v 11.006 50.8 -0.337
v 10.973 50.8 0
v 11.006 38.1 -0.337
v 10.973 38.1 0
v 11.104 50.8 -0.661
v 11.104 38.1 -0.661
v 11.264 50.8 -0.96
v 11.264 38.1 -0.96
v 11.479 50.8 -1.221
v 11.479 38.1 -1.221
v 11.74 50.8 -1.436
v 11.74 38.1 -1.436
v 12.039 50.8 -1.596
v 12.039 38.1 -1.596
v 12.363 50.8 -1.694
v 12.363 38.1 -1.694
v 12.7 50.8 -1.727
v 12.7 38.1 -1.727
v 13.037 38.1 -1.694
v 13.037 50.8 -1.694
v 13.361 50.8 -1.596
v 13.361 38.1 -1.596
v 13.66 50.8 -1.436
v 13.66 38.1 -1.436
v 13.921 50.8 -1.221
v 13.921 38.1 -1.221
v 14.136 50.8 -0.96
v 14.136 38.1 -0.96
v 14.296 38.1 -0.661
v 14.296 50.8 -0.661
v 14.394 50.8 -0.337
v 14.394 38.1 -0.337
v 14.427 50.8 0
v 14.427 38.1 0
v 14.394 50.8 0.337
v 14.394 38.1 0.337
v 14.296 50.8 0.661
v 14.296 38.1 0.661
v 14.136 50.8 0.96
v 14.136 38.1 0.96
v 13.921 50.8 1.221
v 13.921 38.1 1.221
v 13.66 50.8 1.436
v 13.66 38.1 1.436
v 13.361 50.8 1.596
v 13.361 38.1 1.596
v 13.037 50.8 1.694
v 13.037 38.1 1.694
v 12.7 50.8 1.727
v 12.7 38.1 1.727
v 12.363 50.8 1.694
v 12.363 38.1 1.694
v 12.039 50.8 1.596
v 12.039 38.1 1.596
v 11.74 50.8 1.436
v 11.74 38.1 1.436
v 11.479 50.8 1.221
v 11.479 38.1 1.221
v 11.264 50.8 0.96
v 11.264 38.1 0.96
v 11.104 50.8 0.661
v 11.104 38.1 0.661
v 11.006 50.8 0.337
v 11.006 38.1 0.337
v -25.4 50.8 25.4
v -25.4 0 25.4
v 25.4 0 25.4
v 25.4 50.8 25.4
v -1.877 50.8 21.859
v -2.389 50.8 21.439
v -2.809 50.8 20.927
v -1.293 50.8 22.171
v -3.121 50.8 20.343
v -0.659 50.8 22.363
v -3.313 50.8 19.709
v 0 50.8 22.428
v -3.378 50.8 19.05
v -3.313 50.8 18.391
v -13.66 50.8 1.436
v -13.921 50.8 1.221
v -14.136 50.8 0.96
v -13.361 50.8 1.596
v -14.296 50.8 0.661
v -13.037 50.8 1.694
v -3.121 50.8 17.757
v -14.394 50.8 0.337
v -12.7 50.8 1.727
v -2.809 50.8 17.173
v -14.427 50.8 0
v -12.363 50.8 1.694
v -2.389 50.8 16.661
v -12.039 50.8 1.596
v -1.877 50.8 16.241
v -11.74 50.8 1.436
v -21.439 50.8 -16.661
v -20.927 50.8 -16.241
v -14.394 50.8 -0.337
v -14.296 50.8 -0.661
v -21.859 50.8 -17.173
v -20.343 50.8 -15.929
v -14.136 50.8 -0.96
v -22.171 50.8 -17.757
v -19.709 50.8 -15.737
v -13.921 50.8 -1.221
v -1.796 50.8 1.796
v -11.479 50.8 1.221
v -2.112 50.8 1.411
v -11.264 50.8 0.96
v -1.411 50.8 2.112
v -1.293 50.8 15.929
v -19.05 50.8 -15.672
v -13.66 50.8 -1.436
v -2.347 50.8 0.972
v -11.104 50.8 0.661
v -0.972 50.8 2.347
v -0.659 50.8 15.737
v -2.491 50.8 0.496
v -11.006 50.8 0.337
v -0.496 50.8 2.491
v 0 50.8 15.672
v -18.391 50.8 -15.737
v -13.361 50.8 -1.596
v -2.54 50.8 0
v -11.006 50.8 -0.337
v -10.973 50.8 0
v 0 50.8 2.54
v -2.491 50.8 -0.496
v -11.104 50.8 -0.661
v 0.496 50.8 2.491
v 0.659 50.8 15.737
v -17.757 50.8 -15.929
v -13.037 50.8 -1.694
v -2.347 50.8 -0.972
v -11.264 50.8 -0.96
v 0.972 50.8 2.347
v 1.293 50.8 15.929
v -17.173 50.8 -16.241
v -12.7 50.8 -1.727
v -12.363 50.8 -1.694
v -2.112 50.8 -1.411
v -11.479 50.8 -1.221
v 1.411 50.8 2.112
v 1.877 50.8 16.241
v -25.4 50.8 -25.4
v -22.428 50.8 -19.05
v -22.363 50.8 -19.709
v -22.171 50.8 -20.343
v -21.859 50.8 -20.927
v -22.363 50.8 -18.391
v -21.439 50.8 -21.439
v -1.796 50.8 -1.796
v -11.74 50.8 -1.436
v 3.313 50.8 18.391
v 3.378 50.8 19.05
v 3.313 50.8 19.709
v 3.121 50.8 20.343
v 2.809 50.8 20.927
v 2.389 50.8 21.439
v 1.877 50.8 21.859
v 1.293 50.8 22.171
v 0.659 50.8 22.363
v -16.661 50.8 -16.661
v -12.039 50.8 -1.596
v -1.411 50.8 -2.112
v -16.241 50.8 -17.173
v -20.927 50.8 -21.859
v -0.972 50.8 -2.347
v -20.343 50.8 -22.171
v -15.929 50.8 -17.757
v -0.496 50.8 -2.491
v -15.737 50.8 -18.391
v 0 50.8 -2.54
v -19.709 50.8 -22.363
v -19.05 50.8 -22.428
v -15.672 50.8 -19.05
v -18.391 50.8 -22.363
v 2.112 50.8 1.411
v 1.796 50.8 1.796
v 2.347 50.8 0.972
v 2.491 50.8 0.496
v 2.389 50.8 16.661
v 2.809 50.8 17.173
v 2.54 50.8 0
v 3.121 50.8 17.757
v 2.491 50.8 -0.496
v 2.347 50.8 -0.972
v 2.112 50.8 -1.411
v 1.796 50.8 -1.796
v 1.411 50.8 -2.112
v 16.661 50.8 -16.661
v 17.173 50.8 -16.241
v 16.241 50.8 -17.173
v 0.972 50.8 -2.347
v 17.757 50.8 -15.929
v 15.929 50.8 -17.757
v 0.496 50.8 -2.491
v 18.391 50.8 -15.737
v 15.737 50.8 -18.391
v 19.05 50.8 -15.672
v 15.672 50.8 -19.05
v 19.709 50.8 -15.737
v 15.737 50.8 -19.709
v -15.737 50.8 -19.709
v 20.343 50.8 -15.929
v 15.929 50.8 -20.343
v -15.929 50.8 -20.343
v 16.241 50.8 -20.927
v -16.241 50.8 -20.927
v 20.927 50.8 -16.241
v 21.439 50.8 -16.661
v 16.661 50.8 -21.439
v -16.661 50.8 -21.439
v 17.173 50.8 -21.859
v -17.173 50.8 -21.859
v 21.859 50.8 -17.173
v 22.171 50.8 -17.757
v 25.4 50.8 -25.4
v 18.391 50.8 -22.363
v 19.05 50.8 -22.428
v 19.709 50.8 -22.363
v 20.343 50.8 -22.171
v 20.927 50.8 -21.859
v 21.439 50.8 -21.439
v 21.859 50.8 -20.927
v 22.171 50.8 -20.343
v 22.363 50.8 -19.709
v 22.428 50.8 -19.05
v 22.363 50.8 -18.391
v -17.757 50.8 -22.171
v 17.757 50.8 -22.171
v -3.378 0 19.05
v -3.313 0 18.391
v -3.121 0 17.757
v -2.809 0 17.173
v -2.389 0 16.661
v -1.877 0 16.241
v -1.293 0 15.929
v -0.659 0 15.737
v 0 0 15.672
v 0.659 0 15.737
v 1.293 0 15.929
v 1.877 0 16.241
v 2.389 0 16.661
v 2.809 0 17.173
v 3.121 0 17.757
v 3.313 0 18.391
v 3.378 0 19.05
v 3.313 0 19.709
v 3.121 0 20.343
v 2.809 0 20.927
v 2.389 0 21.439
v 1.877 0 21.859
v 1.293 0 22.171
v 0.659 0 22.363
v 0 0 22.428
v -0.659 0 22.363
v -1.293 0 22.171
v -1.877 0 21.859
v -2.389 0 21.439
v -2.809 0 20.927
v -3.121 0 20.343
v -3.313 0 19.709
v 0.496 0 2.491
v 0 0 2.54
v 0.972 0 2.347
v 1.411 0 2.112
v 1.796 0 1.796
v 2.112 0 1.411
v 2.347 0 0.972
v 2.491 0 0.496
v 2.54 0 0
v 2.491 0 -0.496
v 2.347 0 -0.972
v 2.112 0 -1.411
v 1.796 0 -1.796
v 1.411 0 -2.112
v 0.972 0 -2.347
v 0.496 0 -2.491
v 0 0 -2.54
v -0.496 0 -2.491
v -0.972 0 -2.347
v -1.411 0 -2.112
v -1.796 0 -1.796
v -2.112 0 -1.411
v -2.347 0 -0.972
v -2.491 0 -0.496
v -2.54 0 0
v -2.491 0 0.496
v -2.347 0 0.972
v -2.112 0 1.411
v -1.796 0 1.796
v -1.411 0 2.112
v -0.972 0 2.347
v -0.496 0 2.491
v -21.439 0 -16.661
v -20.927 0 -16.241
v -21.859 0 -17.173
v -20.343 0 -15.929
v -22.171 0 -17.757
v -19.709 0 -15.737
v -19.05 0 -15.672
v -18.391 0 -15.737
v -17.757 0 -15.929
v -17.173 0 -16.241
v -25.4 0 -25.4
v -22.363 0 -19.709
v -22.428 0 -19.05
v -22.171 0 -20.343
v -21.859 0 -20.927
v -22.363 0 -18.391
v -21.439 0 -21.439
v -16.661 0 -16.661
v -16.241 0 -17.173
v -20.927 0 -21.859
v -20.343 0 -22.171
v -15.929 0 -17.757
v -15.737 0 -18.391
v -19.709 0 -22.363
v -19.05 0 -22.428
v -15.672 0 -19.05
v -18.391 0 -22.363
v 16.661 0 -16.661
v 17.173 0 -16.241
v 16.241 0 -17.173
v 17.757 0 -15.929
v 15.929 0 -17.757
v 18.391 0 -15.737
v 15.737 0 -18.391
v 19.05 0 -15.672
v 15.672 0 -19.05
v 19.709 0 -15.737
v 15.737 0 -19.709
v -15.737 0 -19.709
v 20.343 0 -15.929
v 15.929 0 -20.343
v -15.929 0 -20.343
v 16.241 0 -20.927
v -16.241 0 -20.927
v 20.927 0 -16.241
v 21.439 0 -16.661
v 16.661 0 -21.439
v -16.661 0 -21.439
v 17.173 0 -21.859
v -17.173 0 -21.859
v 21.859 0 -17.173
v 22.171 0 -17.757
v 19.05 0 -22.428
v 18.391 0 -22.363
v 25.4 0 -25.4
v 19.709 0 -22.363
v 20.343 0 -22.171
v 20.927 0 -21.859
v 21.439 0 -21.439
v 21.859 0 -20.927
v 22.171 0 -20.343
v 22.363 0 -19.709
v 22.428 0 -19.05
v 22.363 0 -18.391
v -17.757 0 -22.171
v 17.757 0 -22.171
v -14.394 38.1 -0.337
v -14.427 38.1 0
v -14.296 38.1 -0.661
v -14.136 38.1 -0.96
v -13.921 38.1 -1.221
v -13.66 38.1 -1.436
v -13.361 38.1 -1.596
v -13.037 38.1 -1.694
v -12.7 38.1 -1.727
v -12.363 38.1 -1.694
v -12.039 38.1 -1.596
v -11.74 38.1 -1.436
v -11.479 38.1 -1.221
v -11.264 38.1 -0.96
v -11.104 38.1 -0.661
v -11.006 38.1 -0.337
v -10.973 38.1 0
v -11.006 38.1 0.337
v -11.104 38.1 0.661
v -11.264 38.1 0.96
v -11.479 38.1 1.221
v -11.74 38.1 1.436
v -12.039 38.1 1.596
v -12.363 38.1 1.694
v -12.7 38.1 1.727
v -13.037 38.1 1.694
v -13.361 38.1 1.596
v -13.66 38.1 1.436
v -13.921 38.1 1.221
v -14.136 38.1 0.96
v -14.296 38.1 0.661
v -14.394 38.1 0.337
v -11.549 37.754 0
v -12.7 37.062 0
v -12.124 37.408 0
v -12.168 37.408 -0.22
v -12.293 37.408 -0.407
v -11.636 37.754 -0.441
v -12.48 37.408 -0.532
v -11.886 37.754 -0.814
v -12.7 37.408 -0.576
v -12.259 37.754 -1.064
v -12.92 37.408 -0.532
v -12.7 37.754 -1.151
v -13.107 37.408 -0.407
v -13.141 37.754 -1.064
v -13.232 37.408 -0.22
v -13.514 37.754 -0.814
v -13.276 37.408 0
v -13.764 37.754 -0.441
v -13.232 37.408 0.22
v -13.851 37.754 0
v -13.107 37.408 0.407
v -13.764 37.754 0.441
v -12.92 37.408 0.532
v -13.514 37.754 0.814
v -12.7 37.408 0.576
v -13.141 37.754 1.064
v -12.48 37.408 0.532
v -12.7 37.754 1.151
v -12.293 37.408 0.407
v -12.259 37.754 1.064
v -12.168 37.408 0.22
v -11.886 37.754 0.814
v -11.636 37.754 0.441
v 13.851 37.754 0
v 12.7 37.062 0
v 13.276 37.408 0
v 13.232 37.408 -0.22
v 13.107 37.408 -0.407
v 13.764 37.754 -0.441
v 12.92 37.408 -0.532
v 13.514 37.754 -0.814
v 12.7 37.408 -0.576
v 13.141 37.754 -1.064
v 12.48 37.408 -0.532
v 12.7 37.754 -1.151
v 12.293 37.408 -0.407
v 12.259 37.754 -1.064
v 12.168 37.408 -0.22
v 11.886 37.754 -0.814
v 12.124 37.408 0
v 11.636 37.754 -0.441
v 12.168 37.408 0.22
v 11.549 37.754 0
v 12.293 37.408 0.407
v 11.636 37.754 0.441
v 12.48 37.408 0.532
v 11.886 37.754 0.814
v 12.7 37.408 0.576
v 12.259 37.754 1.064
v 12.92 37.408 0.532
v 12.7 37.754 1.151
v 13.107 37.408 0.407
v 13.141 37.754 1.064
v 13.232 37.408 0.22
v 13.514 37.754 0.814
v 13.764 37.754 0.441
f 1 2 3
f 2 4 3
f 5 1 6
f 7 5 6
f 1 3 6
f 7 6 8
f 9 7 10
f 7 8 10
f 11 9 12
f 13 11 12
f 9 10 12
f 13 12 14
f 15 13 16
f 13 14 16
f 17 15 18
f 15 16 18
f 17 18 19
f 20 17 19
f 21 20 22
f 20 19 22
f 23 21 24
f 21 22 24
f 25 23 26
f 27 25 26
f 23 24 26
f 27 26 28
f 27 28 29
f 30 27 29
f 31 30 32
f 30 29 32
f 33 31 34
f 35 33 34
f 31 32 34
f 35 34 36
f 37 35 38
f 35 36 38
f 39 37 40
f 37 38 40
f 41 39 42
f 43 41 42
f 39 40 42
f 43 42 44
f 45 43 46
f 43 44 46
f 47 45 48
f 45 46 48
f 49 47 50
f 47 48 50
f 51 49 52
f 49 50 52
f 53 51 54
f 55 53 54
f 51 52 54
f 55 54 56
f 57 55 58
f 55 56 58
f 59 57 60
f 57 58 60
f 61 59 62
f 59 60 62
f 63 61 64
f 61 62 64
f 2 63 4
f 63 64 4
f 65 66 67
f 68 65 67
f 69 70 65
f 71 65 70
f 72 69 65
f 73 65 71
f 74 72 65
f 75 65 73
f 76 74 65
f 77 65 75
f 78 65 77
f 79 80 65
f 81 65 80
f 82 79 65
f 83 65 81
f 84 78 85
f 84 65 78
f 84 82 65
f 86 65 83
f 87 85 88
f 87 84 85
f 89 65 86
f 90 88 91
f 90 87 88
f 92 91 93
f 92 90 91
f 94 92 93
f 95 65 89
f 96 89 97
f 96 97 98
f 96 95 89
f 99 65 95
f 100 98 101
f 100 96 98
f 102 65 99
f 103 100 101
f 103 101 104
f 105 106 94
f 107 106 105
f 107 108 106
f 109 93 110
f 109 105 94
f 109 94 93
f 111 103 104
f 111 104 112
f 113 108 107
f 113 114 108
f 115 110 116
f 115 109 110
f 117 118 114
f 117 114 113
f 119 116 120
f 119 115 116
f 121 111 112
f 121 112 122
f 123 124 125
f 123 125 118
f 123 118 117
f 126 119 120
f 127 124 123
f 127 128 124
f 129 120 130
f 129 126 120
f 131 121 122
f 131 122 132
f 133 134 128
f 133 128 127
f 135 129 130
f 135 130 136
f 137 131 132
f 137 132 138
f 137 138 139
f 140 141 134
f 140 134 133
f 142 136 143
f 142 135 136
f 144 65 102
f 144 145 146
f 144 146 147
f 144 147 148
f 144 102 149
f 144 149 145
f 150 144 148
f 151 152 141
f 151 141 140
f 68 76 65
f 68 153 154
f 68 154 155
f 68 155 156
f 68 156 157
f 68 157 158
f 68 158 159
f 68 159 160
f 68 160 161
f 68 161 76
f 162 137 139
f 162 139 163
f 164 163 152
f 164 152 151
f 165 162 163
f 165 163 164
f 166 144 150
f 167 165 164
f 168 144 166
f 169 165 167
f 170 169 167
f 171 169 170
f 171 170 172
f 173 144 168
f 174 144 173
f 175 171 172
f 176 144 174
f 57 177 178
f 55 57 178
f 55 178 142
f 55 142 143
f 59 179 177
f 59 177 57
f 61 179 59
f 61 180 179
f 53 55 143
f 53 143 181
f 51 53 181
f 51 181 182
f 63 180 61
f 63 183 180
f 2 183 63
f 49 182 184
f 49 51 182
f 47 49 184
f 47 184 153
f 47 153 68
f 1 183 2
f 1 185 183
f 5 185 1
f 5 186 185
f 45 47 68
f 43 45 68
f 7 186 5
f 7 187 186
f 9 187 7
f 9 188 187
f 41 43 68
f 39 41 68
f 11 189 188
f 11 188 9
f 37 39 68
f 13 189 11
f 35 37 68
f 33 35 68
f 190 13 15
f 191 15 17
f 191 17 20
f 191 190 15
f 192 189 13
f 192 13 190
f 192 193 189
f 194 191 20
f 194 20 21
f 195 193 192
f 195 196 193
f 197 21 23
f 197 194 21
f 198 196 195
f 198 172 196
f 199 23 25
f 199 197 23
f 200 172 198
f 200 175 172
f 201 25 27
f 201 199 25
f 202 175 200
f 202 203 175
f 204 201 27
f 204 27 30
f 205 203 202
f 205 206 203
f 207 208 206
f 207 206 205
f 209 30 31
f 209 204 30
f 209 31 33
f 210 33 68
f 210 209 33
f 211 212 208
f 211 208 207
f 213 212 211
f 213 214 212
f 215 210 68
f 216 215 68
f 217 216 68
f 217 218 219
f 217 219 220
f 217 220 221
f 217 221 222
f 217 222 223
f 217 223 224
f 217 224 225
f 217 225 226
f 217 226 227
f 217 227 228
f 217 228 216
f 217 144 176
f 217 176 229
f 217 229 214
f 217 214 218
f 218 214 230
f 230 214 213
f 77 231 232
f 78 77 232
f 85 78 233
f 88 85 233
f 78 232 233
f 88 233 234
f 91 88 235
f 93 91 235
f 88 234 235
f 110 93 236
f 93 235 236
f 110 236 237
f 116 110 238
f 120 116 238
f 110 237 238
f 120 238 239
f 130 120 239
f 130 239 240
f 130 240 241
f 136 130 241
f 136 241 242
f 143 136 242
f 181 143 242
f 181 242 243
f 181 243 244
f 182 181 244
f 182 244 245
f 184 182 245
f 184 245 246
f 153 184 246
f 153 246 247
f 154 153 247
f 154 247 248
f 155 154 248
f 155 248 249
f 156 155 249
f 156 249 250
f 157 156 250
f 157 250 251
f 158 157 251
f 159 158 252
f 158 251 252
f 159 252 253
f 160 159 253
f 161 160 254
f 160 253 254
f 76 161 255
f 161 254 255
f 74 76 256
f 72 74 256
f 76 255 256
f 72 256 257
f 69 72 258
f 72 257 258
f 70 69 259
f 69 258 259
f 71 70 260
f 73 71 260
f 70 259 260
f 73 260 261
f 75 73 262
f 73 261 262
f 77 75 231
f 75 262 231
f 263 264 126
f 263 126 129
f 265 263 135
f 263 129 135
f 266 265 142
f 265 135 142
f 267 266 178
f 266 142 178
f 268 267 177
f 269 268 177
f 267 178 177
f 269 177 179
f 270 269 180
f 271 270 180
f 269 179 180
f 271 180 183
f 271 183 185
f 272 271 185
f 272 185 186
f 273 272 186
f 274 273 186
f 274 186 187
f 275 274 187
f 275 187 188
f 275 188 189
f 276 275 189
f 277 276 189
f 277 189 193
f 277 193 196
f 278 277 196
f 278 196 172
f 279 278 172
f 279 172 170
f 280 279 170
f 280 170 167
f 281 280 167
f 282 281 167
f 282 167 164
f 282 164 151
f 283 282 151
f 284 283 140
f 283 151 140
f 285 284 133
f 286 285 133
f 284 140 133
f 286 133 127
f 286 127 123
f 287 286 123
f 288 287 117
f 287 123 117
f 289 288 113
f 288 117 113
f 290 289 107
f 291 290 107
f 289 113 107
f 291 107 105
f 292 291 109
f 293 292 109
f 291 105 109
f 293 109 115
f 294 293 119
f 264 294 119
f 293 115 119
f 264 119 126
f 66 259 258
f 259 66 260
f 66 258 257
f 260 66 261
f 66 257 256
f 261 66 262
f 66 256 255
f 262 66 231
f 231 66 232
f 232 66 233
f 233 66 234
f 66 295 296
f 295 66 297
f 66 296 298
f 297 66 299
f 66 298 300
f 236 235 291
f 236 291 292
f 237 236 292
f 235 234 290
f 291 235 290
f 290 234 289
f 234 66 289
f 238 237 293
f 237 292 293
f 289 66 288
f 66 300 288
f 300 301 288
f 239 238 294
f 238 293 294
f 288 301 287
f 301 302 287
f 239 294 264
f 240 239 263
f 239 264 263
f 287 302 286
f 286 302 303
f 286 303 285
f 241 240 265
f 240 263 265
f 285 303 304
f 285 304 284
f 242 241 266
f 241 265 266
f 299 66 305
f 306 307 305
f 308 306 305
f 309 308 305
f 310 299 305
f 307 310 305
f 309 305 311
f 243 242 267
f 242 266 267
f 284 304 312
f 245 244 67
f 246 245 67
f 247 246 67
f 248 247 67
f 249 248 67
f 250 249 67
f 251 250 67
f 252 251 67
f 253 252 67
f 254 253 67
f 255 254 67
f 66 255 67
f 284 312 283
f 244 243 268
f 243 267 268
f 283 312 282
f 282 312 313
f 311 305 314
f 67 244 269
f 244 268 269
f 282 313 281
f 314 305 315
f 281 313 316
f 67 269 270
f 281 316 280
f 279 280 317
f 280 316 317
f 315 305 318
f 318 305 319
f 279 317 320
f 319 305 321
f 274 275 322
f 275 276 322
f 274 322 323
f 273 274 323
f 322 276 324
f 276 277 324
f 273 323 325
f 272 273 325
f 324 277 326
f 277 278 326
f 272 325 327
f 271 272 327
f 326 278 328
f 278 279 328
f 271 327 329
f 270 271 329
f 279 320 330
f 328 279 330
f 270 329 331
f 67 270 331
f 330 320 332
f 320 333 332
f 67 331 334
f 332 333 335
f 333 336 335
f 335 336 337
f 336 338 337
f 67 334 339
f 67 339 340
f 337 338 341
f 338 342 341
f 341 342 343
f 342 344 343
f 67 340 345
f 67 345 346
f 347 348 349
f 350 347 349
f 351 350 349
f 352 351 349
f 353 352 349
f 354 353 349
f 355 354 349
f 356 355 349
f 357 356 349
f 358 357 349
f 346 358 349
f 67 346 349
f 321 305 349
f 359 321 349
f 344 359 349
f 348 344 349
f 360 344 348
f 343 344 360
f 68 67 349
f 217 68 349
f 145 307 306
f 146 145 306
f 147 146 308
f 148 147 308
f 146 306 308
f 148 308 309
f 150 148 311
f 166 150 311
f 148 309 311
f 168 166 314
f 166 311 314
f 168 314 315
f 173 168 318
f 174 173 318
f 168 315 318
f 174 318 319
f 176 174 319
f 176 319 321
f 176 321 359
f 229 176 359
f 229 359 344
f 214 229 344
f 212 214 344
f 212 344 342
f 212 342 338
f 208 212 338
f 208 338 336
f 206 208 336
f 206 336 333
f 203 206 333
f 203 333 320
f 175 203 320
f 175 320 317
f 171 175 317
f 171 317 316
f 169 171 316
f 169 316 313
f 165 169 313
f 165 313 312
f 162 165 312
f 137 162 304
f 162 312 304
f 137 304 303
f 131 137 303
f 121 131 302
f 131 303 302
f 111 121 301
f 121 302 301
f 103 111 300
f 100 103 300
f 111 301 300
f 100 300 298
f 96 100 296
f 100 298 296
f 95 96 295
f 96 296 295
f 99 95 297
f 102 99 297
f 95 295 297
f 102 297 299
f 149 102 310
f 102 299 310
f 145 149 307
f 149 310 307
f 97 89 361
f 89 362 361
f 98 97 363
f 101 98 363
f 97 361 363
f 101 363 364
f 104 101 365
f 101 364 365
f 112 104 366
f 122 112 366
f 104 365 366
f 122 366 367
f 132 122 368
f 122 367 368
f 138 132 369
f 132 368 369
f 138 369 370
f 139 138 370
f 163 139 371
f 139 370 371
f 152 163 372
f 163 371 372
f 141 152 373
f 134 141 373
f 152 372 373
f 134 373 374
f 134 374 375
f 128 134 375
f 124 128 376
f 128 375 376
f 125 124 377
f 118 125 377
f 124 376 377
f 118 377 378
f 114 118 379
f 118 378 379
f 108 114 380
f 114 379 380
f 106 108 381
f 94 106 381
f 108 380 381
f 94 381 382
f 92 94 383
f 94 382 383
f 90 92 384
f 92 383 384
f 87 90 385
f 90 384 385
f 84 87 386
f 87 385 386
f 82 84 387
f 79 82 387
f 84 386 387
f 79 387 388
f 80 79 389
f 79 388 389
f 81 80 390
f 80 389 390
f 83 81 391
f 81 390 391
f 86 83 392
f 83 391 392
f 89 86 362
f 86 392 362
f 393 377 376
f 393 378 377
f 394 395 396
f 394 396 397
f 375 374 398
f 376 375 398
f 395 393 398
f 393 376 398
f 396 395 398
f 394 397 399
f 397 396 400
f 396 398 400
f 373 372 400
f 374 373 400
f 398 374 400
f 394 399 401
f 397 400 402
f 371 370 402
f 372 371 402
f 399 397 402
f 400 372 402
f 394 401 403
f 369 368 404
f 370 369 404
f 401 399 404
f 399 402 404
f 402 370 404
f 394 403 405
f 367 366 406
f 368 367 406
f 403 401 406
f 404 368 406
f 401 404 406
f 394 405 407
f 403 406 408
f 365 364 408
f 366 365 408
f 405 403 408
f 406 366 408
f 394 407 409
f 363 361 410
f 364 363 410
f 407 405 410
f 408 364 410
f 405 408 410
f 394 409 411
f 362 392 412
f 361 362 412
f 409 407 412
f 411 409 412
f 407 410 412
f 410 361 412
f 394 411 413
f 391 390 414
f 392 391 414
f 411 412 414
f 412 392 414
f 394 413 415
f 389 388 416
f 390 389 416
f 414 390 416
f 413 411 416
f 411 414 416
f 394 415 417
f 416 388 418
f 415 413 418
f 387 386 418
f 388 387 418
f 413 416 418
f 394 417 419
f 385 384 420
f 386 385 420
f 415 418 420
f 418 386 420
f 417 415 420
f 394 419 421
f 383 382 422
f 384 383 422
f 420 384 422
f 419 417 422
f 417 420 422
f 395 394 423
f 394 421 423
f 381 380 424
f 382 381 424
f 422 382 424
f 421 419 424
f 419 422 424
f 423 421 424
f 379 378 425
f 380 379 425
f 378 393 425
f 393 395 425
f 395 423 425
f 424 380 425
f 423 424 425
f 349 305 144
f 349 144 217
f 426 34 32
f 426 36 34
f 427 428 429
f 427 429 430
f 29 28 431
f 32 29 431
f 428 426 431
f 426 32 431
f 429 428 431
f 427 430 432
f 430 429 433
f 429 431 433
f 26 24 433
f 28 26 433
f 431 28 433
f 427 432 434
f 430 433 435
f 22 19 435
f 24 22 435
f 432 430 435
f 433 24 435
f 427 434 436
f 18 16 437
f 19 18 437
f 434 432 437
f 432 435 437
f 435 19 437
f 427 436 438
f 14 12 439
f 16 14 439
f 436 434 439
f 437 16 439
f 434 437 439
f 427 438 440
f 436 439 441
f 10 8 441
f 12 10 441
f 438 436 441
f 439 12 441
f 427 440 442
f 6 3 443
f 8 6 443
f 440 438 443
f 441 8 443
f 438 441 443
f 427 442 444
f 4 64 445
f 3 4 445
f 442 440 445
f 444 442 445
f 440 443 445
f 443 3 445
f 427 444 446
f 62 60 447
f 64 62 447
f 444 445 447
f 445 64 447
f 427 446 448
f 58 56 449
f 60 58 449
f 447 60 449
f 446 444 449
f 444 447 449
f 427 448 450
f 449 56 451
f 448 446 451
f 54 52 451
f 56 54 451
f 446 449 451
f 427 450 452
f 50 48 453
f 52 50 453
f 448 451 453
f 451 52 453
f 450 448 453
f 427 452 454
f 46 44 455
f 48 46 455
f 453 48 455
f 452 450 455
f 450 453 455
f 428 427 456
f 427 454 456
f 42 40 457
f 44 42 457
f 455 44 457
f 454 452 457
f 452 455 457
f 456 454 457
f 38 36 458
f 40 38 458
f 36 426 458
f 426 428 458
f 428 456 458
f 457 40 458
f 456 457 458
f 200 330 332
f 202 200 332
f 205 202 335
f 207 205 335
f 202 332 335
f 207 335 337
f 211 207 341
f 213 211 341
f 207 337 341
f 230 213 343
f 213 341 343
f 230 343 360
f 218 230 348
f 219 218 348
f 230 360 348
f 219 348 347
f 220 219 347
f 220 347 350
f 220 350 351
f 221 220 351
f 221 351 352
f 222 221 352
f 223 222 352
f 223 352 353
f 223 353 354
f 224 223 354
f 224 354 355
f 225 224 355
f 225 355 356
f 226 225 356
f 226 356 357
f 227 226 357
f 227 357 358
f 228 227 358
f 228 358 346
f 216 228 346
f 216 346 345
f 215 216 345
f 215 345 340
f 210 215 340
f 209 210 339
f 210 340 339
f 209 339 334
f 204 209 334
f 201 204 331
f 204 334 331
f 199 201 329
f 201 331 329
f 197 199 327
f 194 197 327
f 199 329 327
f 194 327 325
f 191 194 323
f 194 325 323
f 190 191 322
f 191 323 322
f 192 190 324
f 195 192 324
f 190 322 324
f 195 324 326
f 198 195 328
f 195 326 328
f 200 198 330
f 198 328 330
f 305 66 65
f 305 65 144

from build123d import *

# Parameters (mm, degrees)
SKETCH1_W                     = 50.8
SKETCH1_H                     = 50.8
BOSS_EXTRUDE1_DEPTH           = 50.8
F_1_4_CLEARANCE_HOLE1_D       = 6.7564
SKETCH4_R                     = 2.54
CUT_EXTRUDE1_DEPTH            = 63.217039467
TAP_DRILL_FOR_8_32_TAP1_D     = 3.4544
TAP_DRILL_FOR_8_32_TAP1_DEPTH = 12.7
TAP_DRILL_FOR_8_32_TAP1_TIP   = 1.037806461


with BuildPart() as part:
    # Sketch1 → Boss-Extrude1 (new body)
    with BuildSketch(Plane(origin=(0, 0, 0), x_dir=(1, 0, 0), z_dir=(0, 1, 0))):
        Rectangle(SKETCH1_W, SKETCH1_H)
    extrude(amount=BOSS_EXTRUDE1_DEPTH)

    # 1/4 Clearance Hole1 (through all)
    with Locations(Plane(origin=(0, 50.8, 0), x_dir=(1, 0, 0), z_dir=(0, 1, 0))):
        with Locations((-19.05, 19.05), (19.05, 19.05), (0, -19.05)):
            Hole(F_1_4_CLEARANCE_HOLE1_D / 2)

    # Sketch4 → Cut-Extrude1 (cut, through all)
    with BuildSketch(Plane(origin=(0, 50.8, 0), x_dir=(1, 0, 0), z_dir=(0, 1, 0))):
        with Locations(Location((0, 0, 0), (0, 0, 270))):
            Circle(SKETCH4_R)
    extrude(amount=-CUT_EXTRUDE1_DEPTH, mode=Mode.SUBTRACT)

    # Tap Drill for #8-32 Tap1
    with Locations(Plane(origin=(0, 50.8, 0), x_dir=(1, 0, 0), z_dir=(0, 1, 0))):
        with Locations((-12.7, 0), (12.7, 0)):
            Hole(TAP_DRILL_FOR_8_32_TAP1_D / 2, depth=TAP_DRILL_FOR_8_32_TAP1_DEPTH)
            with Locations((0, 0, -(TAP_DRILL_FOR_8_32_TAP1_DEPTH + TAP_DRILL_FOR_8_32_TAP1_TIP / 2))):  # 118° drill point
                Cone(0, TAP_DRILL_FOR_8_32_TAP1_D / 2, TAP_DRILL_FOR_8_32_TAP1_TIP, mode=Mode.SUBTRACT)


solid = part.part
